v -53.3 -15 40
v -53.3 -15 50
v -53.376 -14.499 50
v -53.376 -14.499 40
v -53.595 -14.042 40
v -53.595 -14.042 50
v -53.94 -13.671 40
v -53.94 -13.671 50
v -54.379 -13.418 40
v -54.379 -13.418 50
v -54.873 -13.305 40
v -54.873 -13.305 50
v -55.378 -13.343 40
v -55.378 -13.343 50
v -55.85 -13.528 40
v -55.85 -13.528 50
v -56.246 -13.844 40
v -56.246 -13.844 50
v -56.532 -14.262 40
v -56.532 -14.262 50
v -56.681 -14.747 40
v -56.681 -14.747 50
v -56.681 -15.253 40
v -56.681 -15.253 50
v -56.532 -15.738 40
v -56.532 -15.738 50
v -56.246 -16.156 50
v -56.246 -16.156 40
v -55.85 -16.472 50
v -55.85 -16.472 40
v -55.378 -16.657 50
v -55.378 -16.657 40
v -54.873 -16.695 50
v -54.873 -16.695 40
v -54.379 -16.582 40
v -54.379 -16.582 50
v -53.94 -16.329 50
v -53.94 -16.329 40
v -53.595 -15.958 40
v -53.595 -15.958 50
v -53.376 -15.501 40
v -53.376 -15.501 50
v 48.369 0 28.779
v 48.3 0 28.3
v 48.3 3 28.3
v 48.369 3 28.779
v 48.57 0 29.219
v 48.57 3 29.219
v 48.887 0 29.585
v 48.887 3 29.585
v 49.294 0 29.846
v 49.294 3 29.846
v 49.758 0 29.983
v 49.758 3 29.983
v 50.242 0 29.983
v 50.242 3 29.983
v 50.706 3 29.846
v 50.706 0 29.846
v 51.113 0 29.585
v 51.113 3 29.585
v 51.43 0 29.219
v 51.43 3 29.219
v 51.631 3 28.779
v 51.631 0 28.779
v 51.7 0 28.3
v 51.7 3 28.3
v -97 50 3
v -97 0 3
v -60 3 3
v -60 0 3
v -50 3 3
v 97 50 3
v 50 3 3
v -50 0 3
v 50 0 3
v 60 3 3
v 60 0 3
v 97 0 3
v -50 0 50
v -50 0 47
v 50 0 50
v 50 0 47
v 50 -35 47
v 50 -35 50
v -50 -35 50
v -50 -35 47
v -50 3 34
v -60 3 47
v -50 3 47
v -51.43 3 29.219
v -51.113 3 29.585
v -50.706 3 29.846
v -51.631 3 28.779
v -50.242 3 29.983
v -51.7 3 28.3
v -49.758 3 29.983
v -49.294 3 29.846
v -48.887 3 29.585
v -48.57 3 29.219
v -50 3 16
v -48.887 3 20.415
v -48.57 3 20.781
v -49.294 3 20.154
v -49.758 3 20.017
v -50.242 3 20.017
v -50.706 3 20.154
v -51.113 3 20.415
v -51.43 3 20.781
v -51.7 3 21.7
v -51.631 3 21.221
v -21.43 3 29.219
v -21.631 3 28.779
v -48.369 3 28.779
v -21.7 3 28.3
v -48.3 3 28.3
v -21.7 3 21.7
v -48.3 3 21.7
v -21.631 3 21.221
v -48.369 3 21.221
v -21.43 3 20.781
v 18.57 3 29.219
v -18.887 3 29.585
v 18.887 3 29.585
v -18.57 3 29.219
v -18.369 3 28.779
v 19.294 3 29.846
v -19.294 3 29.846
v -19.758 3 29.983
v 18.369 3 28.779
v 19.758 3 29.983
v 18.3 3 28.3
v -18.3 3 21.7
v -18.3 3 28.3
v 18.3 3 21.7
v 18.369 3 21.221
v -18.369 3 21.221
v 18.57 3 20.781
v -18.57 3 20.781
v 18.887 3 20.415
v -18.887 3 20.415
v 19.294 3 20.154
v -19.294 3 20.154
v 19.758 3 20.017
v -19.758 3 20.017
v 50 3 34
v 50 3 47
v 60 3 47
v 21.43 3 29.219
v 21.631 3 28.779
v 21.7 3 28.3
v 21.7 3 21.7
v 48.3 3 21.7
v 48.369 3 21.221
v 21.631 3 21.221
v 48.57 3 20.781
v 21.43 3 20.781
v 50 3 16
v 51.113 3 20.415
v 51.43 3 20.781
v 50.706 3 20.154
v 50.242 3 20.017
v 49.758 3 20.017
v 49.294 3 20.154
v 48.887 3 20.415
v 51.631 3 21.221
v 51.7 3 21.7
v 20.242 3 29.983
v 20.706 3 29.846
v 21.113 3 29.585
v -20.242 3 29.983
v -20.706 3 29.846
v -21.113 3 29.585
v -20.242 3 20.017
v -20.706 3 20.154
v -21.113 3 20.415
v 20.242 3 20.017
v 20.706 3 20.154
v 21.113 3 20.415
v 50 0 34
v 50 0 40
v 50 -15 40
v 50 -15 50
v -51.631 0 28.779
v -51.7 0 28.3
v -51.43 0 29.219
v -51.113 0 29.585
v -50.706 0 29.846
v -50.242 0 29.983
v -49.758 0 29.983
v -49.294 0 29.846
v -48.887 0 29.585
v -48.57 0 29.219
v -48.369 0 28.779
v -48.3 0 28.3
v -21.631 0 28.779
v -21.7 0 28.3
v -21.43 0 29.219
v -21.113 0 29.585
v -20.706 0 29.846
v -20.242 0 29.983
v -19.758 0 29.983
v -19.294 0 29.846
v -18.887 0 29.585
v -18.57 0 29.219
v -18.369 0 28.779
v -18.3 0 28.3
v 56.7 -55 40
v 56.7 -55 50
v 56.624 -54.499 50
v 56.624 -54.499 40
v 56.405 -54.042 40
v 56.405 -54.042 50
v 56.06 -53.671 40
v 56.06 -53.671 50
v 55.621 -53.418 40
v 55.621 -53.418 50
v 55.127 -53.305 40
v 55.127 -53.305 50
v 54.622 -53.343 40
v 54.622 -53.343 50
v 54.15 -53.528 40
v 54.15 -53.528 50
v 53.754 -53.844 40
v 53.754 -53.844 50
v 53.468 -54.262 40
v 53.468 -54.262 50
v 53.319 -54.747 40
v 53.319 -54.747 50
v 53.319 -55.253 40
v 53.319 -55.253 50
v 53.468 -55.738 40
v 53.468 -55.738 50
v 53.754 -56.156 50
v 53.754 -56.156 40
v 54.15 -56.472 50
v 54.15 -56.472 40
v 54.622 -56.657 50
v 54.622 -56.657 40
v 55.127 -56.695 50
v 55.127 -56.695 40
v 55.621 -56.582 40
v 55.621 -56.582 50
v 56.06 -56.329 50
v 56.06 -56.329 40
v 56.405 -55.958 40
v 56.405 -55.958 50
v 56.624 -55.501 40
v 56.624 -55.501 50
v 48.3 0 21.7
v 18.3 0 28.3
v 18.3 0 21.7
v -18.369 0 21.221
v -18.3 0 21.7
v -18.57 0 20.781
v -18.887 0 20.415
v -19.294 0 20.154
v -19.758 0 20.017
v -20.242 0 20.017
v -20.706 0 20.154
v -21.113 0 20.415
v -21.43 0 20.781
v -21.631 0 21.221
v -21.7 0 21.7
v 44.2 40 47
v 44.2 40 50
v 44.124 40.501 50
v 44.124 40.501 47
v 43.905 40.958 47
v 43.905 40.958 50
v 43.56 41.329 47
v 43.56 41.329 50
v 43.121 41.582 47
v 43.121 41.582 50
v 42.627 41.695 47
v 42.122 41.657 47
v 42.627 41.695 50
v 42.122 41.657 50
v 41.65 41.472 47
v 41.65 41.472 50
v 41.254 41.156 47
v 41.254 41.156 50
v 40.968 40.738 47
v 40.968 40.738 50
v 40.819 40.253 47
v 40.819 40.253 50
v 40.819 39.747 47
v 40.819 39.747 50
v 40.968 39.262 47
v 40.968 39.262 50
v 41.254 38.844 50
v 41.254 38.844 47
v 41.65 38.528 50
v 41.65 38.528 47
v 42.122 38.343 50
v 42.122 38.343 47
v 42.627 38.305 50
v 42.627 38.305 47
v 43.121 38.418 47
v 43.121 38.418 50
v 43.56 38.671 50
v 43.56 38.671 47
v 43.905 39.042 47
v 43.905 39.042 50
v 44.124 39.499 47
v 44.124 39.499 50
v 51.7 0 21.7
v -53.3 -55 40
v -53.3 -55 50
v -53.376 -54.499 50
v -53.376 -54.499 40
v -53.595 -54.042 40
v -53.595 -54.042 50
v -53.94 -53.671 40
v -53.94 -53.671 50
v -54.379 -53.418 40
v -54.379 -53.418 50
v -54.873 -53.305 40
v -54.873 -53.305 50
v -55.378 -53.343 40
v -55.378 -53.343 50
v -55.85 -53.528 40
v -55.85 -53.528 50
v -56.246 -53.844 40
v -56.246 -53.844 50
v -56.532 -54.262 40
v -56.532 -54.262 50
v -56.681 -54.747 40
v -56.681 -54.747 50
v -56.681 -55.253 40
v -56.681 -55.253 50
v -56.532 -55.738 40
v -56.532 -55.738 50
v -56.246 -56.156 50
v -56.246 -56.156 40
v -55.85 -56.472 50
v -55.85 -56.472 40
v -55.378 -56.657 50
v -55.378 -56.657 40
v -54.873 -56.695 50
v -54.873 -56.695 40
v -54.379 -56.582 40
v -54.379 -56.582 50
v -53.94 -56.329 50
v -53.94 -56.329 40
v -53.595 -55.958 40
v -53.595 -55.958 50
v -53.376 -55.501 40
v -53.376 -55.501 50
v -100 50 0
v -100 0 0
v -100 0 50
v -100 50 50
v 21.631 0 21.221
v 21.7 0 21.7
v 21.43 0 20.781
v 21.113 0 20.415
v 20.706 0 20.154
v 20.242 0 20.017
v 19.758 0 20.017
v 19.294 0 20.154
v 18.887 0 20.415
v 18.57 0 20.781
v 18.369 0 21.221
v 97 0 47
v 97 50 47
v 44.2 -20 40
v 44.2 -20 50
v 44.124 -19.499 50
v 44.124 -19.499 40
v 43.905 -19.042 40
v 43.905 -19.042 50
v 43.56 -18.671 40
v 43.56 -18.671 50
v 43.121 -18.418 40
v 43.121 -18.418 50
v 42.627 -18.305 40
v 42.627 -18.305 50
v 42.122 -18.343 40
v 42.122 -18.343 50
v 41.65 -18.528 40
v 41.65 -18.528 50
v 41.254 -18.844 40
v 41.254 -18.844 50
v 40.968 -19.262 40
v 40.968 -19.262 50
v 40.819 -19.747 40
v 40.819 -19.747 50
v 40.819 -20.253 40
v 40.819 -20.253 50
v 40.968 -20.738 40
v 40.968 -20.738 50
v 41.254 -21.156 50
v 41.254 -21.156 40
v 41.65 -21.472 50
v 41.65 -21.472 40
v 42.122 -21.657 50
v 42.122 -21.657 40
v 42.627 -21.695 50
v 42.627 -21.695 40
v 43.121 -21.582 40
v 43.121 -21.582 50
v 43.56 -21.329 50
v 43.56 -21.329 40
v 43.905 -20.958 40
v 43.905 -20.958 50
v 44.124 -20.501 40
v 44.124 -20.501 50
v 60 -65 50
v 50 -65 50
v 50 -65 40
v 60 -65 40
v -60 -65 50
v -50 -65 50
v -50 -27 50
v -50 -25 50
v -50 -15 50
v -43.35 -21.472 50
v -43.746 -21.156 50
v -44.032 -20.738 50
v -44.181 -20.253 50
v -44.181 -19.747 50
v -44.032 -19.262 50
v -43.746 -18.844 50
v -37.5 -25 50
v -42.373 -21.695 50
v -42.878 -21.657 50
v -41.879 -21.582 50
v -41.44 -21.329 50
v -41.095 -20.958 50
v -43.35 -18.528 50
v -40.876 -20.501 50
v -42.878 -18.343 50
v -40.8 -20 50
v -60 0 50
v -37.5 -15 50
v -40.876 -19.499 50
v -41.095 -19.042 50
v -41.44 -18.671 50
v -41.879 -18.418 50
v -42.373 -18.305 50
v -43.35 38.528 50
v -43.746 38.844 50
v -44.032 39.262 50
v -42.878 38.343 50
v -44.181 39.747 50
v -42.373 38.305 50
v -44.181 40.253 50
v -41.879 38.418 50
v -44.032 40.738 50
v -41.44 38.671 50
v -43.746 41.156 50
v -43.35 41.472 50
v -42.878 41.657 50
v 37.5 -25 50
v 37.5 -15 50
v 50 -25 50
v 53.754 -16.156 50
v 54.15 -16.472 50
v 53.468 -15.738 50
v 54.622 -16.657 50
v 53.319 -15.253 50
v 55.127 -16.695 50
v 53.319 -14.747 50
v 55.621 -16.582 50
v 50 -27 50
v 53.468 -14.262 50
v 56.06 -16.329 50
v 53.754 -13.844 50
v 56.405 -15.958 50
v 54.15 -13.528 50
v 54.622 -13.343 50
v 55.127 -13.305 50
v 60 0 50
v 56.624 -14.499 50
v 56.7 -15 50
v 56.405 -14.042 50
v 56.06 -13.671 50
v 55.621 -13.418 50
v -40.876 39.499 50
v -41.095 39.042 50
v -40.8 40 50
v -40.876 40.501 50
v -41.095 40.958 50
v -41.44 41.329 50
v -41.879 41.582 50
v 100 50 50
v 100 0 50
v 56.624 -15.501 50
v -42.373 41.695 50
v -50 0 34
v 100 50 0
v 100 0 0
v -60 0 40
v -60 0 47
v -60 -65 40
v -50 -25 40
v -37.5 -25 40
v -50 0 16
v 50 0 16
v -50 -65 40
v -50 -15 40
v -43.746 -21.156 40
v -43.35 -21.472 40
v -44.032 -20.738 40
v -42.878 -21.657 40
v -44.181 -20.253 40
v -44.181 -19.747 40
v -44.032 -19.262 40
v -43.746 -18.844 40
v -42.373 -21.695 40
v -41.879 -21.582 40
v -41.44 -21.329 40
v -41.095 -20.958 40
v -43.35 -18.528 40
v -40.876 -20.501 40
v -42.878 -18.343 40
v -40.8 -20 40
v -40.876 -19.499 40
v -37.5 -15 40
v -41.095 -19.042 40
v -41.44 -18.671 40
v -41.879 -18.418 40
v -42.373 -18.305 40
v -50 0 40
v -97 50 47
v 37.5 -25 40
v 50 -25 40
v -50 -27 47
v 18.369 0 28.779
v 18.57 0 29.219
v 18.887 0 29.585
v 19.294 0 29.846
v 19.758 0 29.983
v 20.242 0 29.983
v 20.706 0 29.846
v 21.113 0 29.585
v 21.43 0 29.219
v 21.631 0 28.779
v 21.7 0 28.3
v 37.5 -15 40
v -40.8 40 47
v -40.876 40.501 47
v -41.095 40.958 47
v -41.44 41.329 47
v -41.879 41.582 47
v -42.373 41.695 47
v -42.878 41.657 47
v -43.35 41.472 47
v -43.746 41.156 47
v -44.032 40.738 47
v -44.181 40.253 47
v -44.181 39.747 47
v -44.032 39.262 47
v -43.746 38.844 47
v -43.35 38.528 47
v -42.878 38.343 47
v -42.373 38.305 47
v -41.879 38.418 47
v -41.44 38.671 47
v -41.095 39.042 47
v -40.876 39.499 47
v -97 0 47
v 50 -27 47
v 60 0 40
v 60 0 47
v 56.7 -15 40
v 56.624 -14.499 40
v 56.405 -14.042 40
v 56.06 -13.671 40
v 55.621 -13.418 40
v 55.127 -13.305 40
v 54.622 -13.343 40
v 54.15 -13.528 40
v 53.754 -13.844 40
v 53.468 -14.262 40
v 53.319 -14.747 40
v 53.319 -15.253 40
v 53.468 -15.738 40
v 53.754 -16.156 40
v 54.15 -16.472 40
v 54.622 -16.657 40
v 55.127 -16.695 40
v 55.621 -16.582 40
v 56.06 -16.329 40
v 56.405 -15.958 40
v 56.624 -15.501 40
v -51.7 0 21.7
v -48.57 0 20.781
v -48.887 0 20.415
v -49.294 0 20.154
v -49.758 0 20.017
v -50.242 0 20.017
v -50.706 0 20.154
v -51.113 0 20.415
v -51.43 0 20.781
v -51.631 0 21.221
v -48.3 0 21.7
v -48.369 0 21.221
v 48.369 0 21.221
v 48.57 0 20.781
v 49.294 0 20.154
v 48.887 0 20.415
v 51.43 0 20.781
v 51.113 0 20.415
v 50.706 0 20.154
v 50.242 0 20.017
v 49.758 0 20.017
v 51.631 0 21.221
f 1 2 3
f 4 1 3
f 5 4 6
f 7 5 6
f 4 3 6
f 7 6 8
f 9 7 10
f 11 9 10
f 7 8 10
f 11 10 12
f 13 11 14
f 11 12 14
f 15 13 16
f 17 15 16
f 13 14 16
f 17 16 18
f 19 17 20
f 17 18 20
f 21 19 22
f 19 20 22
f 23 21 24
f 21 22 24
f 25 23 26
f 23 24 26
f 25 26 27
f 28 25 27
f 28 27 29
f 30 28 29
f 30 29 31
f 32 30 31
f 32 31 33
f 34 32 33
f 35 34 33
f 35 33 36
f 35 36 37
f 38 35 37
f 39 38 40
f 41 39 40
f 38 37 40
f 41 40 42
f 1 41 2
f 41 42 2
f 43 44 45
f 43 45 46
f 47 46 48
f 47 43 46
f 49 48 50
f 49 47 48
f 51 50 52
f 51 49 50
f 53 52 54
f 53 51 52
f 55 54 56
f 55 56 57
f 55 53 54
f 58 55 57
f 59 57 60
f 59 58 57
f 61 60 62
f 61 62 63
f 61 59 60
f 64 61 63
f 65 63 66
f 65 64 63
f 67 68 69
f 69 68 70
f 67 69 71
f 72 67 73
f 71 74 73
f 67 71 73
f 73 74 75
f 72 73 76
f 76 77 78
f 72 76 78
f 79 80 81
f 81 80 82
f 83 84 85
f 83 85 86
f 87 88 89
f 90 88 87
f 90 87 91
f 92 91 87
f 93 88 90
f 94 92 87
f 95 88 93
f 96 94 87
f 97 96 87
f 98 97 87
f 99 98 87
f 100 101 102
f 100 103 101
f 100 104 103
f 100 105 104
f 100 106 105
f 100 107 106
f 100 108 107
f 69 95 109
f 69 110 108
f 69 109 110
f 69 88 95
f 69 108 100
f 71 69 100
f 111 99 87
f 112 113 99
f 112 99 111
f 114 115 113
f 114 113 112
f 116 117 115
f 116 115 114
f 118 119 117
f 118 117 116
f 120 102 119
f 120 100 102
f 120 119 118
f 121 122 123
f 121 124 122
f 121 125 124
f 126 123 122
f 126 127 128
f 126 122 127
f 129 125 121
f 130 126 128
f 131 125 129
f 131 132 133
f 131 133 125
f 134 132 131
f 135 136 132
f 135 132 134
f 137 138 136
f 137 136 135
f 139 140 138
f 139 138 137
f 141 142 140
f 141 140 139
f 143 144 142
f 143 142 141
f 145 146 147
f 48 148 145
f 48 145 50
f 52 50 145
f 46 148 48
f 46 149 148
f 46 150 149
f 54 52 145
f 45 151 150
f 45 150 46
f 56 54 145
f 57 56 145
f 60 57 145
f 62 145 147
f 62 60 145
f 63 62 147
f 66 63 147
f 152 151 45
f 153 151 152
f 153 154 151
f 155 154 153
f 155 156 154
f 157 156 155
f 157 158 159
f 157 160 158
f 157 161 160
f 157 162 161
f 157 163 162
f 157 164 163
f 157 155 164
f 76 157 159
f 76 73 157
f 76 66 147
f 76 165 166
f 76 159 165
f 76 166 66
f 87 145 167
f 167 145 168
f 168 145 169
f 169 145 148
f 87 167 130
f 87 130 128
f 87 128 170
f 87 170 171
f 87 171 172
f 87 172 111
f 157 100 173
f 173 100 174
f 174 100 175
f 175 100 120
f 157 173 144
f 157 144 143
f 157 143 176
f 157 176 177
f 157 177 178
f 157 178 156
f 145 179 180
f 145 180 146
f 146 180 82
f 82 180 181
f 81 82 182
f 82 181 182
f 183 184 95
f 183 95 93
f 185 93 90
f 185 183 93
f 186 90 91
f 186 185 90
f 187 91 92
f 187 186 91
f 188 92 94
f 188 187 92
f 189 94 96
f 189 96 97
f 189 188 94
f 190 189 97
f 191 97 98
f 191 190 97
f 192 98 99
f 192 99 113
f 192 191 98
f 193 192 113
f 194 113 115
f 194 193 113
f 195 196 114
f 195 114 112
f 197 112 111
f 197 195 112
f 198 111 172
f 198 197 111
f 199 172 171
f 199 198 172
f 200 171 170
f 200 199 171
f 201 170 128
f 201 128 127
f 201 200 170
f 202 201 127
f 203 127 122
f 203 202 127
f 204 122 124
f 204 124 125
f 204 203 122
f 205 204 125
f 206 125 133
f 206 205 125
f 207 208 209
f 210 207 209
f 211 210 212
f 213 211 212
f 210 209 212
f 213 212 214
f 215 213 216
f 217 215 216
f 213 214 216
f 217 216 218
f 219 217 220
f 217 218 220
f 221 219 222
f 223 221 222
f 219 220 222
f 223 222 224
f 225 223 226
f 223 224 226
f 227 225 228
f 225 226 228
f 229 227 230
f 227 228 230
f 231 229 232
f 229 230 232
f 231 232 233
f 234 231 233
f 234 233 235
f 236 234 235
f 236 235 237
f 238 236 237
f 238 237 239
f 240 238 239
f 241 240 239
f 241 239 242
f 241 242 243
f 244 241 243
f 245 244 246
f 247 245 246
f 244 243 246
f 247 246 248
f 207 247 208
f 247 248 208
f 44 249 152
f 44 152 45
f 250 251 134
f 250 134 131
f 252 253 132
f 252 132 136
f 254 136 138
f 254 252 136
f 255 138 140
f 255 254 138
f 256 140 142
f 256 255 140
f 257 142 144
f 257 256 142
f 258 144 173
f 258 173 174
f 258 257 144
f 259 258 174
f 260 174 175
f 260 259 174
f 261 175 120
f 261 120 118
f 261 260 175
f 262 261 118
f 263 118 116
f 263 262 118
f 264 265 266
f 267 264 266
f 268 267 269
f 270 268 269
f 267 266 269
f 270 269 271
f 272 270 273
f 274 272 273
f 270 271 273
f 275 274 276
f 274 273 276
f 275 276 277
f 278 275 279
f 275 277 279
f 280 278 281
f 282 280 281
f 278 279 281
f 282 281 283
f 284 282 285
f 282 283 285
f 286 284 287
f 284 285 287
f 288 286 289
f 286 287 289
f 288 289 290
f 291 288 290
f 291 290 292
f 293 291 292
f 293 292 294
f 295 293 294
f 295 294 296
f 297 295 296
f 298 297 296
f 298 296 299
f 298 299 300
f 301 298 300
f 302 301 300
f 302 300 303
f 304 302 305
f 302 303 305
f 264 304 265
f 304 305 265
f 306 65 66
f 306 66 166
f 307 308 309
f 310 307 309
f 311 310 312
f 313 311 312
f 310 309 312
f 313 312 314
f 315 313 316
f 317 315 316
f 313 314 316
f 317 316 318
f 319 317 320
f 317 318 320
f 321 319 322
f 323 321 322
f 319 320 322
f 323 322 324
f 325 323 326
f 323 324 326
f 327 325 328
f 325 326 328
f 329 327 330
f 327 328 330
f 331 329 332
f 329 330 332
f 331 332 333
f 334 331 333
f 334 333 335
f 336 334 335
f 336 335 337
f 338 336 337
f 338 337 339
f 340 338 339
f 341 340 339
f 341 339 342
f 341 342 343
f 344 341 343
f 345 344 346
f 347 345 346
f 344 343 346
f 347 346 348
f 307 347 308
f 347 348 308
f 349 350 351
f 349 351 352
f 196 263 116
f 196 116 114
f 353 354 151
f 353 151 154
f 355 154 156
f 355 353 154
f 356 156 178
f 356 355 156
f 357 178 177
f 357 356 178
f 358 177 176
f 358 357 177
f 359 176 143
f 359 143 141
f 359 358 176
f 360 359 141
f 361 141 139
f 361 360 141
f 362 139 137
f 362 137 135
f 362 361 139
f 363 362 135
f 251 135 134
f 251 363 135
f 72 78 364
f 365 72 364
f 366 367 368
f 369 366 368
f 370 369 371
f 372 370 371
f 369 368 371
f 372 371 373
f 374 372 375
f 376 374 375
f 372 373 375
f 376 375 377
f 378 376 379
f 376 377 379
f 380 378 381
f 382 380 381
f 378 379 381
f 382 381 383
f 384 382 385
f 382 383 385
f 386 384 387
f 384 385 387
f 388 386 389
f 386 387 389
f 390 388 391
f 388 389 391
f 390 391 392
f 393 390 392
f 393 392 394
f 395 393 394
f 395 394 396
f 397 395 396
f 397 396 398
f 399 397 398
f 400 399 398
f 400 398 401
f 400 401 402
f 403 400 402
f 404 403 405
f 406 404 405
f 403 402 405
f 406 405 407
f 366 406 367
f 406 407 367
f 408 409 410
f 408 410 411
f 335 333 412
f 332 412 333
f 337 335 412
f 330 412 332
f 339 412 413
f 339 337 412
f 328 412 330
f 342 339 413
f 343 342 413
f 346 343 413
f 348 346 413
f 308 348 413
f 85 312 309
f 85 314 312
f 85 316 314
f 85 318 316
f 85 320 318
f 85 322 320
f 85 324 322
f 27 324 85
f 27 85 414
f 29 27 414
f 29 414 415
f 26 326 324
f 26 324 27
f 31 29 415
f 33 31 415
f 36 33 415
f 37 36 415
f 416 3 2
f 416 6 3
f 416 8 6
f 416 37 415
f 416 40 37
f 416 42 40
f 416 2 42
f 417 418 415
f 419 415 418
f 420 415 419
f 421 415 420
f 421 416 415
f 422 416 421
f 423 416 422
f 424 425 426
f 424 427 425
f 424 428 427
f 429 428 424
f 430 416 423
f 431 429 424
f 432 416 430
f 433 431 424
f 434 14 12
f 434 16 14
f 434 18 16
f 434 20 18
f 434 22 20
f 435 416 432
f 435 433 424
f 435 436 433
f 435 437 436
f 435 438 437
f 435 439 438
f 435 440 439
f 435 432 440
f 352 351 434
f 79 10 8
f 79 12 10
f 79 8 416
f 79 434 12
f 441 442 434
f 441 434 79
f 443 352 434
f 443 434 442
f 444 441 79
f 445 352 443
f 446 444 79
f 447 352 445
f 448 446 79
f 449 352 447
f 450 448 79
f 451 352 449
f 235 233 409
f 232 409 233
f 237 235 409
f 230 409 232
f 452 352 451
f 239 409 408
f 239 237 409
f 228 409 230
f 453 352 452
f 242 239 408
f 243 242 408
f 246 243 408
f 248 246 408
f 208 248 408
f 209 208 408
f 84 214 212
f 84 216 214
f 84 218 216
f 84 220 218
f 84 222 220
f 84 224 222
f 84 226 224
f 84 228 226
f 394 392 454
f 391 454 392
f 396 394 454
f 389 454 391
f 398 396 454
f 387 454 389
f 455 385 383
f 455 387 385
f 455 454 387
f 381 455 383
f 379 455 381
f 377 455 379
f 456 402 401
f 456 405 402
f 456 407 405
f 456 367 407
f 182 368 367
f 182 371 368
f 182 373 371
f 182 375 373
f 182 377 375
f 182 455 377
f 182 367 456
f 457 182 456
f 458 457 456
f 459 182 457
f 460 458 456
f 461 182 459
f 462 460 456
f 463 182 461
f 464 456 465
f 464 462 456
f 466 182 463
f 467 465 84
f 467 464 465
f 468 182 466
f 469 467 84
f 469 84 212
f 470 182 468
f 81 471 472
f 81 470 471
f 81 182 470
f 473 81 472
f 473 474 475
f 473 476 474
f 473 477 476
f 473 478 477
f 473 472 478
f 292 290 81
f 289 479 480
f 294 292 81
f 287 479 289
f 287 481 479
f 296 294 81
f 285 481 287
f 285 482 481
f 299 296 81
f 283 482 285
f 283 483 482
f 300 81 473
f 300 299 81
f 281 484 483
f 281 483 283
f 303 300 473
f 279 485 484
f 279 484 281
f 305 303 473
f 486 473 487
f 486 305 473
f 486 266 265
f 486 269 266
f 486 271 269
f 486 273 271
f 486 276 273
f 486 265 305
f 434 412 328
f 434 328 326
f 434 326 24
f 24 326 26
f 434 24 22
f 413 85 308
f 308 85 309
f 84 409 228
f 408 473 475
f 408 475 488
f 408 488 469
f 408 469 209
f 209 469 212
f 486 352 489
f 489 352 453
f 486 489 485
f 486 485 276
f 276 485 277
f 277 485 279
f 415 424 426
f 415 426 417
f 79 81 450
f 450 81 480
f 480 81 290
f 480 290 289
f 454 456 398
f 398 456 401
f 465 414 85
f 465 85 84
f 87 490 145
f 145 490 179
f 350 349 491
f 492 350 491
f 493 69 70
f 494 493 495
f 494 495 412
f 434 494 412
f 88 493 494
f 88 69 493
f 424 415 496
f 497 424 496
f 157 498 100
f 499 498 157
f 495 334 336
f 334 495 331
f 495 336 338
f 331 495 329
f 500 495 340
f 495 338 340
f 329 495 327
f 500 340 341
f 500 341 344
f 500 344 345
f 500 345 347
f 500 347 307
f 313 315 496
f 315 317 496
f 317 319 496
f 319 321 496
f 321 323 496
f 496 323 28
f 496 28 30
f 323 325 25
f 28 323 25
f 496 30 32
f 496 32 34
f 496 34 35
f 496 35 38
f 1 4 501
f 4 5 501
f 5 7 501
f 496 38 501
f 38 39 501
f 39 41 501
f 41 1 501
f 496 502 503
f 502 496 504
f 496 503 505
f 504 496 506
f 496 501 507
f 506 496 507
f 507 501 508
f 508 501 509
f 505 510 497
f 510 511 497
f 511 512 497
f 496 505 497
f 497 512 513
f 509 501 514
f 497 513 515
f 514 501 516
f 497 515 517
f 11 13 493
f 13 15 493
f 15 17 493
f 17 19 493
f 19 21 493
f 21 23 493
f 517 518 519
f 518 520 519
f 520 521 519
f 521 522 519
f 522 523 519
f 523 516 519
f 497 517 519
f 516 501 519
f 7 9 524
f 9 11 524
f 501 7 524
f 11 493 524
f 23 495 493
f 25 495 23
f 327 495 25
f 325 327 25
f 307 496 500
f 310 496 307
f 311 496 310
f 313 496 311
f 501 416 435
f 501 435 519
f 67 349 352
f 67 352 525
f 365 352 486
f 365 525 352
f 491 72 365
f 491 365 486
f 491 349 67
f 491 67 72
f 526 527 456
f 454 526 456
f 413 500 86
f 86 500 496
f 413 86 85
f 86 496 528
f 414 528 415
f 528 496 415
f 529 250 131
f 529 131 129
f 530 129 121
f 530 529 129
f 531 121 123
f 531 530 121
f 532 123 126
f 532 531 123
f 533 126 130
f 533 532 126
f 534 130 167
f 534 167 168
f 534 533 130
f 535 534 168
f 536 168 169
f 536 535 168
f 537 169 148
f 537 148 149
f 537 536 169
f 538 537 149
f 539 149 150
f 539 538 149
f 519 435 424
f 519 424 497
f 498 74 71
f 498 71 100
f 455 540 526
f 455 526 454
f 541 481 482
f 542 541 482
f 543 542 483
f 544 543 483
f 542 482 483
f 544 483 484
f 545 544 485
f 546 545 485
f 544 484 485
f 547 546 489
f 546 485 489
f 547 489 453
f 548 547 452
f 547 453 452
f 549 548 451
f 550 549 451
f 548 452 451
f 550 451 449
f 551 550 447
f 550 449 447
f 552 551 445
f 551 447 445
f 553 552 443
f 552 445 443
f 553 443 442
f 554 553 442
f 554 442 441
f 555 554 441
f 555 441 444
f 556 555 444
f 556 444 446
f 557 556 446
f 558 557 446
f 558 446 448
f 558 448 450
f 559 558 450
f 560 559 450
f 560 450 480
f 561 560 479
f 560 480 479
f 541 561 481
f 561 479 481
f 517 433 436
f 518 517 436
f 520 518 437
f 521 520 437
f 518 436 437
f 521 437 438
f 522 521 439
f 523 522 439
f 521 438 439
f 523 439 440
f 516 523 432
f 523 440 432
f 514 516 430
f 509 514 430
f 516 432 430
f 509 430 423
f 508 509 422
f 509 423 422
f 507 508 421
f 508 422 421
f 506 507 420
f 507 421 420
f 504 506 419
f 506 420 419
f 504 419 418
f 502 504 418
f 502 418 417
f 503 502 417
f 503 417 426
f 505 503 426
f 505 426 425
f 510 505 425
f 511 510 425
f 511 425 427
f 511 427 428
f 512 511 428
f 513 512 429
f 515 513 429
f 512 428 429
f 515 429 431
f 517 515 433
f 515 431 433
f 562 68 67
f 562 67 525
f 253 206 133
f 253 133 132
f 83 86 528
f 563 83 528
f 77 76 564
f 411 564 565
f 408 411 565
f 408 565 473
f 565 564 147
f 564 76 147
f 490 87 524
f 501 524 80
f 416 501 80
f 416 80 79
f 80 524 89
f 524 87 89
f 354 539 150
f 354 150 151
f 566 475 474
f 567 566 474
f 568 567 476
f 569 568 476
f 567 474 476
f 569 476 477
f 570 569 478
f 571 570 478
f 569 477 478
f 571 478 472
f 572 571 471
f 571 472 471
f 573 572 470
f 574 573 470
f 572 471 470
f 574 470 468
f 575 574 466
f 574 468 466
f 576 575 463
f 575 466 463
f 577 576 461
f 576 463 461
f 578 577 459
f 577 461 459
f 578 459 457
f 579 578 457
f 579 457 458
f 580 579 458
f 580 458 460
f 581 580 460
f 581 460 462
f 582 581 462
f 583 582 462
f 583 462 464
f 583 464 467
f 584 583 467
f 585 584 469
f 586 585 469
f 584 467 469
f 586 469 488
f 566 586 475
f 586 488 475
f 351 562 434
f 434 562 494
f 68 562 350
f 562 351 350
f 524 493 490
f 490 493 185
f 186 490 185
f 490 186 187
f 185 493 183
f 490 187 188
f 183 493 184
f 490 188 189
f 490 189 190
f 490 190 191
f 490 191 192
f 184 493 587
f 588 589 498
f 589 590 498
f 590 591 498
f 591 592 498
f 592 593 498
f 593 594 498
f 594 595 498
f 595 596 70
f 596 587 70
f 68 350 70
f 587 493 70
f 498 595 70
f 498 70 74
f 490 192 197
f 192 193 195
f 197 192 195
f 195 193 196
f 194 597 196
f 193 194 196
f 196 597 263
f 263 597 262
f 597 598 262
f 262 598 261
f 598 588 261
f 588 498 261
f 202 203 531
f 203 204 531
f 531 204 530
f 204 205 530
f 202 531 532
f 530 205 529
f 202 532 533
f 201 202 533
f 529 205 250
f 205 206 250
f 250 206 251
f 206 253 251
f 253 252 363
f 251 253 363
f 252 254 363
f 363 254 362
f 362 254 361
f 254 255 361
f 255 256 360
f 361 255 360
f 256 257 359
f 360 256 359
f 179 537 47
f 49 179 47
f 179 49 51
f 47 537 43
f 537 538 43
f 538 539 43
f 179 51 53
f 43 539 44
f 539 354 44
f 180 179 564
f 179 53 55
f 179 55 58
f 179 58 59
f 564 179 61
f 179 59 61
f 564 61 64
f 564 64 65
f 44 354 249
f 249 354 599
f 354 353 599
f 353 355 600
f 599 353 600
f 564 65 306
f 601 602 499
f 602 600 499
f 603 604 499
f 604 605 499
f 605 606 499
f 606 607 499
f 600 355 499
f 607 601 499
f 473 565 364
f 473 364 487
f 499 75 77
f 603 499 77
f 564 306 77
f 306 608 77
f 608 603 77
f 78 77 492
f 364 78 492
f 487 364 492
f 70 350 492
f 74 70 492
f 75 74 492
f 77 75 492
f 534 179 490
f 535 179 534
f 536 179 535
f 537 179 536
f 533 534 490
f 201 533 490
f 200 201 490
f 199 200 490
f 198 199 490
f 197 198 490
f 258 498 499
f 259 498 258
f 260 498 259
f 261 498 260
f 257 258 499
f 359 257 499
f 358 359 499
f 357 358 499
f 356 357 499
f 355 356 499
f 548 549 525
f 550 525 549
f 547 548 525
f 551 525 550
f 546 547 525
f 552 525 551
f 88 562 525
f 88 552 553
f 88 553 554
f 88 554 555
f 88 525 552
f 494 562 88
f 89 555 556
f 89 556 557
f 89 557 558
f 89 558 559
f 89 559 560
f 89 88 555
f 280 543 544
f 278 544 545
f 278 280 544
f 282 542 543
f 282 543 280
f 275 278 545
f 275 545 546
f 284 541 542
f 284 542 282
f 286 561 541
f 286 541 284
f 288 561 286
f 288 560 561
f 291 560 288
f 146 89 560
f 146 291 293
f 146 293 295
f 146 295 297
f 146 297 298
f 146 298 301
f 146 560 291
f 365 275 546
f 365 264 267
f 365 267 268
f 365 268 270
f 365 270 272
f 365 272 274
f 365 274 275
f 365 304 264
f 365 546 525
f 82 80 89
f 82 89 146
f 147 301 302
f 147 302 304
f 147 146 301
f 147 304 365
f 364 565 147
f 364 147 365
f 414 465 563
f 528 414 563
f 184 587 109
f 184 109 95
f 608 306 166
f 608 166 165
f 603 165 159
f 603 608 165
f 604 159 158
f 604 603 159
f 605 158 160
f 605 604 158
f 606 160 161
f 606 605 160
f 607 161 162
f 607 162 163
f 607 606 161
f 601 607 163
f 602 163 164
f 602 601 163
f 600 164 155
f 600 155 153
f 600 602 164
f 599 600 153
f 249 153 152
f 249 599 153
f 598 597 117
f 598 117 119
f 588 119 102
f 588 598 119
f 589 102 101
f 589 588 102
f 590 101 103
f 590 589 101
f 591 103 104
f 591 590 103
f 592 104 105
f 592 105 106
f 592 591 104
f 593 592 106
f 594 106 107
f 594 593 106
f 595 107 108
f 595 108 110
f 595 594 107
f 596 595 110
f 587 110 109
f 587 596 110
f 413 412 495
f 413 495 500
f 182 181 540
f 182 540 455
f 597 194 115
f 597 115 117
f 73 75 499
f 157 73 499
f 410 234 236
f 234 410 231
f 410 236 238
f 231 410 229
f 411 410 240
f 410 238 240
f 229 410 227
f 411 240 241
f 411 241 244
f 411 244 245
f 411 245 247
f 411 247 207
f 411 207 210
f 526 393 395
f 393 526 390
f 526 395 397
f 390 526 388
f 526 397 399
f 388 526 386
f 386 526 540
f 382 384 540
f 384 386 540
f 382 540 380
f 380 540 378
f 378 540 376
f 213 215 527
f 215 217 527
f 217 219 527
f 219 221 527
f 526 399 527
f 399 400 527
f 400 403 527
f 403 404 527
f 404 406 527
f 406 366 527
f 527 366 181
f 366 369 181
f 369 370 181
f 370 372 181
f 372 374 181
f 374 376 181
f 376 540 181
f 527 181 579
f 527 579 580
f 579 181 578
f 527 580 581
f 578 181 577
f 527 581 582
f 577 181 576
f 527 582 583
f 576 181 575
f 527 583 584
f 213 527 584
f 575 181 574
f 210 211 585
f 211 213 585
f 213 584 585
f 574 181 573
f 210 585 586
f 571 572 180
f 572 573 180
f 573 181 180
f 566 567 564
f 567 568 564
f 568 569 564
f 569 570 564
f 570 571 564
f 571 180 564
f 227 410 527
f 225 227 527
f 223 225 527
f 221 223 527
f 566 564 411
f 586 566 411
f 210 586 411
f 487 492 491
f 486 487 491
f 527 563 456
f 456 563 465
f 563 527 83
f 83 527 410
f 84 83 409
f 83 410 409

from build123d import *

# Parameters (mm, degrees)
BOX_FOOTPRINT_200_X_50_MM_W                      = 200
BOX_FOOTPRINT_200_X_50_MM_H                      = 50
BOX_HEIGHT_50_MM_DEPTH                           = 50
REAR_OPENING_194_X_44_MM_W                       = 194
REAR_OPENING_194_X_44_MM_H                       = 44
REAR_CAVITY_WALL_3_MM_DEPTH                      = 47
CHASSIS_FACE_OPENINGS_AND_MOUNTING_CROSS_W       = 37
CHASSIS_FACE_OPENINGS_AND_MOUNTING_CROSS_H       = 44
CHASSIS_FACE_OPENINGS_AND_MOUNTING_CROSS_W_2     = 100
CHASSIS_FACE_OPENINGS_AND_MOUNTING_CROSS_H_2     = 13
OPEN_FRONT_MOUNTING_FRAME_DEPTH                  = 3
PHOTO_RAILS_10_X_10_PITCH_110_PROVISIONA_W       = 10
PHOTO_RAILS_10_X_10_PITCH_110_PROVISIONA_H       = 10
TWO_FORWARD_RAILS_65_MM_PROVISIONAL_DEPTH        = 65
LEFT_INWARD_PCB_MOUNTING_EAR_W                   = 10
LEFT_INWARD_PCB_MOUNTING_EAR_H                   = 10
LEFT_PCB_EAR_12_5_MM_DEPTH                       = 12.5
RIGHT_INWARD_PCB_MOUNTING_EAR_W                  = 10
RIGHT_INWARD_PCB_MOUNTING_EAR_H                  = 10
RIGHT_PCB_EAR_12_5_MM_DEPTH                      = 12.5
OPEN_FRAME_TRANSVERSE_BRACE_8_X_3_MM_W           = 3
OPEN_FRAME_TRANSVERSE_BRACE_8_X_3_MM_H           = 8
TRANSVERSE_FRAME_BRACE_DEPTH                     = 100
F_4X_VERTICAL_SLOTS_3_4_X_10_MM_DEPTH            = 3
PCB_REAR_HOLES_PITCH_85_MM_R                     = 1.7
PCB_ROOF_HOLES_DIAMETER_3_4_MM_DEPTH             = 3
PCB_FRONT_HOLES_ROW_SPACING_60_MM_R              = 1.7
PCB_EAR_HOLES_DIAMETER_3_4_MM_DEPTH              = 10
CHASSIS_TOP_HOLES_110_X_40_PROVISIONAL_R         = 1.7
F_4X_RAIL_HOLES_THROUGH_UPPER_AND_LOWER_FA_DEPTH = 10


with BuildPart() as part:
    # Box footprint 200 x 50 mm → Box height 50 mm (new body)
    with BuildSketch(Plane.XY):
        with Locations((0, 25)):
            Rectangle(BOX_FOOTPRINT_200_X_50_MM_W, BOX_FOOTPRINT_200_X_50_MM_H)
    extrude(amount=BOX_HEIGHT_50_MM_DEPTH)

    # Rear opening 194 x 44 mm → Rear cavity wall 3 mm (cut)
    with BuildSketch(Plane(origin=(0, 50, 0), x_dir=(1, 0, 0), z_dir=(0, 1, 0))):
        with Locations((0, -25)):
            Rectangle(REAR_OPENING_194_X_44_MM_W, REAR_OPENING_194_X_44_MM_H)
    extrude(amount=-REAR_CAVITY_WALL_3_MM_DEPTH, mode=Mode.SUBTRACT)

    # Chassis face openings and mounting crossbar → Open front mounting frame (cut)
    with BuildSketch(Plane.XZ):
        with Locations((-78.5, 25)):
            Rectangle(CHASSIS_FACE_OPENINGS_AND_MOUNTING_CROSS_W, CHASSIS_FACE_OPENINGS_AND_MOUNTING_CROSS_H)
        with Locations((78.5, 25)):
            Rectangle(CHASSIS_FACE_OPENINGS_AND_MOUNTING_CROSS_W, CHASSIS_FACE_OPENINGS_AND_MOUNTING_CROSS_H)
        with Locations((0, 9.5)):
            Rectangle(CHASSIS_FACE_OPENINGS_AND_MOUNTING_CROSS_W_2, CHASSIS_FACE_OPENINGS_AND_MOUNTING_CROSS_H_2)
        with Locations((0, 40.5)):
            Rectangle(CHASSIS_FACE_OPENINGS_AND_MOUNTING_CROSS_W_2, CHASSIS_FACE_OPENINGS_AND_MOUNTING_CROSS_H_2)
    extrude(amount=-OPEN_FRONT_MOUNTING_FRAME_DEPTH, mode=Mode.SUBTRACT)

    # Photo rails 10 x 10 pitch 110 provisional → Two forward rails 65 mm provisional (add)
    with BuildSketch(Plane.XZ):
        with Locations((-55, 45)):
            Rectangle(PHOTO_RAILS_10_X_10_PITCH_110_PROVISIONA_W, PHOTO_RAILS_10_X_10_PITCH_110_PROVISIONA_H)
        with Locations((55, 45)):
            Rectangle(PHOTO_RAILS_10_X_10_PITCH_110_PROVISIONA_W, PHOTO_RAILS_10_X_10_PITCH_110_PROVISIONA_H)
    extrude(amount=TWO_FORWARD_RAILS_65_MM_PROVISIONAL_DEPTH)

    # Left inward PCB mounting ear → Left PCB ear 12.5 mm (add)
    with BuildSketch(Plane(origin=(-50, 0, 0), x_dir=(0, 0, -1), z_dir=(1, 0, 0))):
        with Locations((-45, -20)):
            Rectangle(LEFT_INWARD_PCB_MOUNTING_EAR_W, LEFT_INWARD_PCB_MOUNTING_EAR_H)
    extrude(amount=LEFT_PCB_EAR_12_5_MM_DEPTH)

    # Right inward PCB mounting ear → Right PCB ear 12.5 mm (add)
    with BuildSketch(Plane.ZY.offset(-50)):
        with Locations((45, -20)):
            Rectangle(RIGHT_INWARD_PCB_MOUNTING_EAR_W, RIGHT_INWARD_PCB_MOUNTING_EAR_H)
    extrude(amount=RIGHT_PCB_EAR_12_5_MM_DEPTH)

    # Open frame transverse brace 8 x 3 mm → Transverse frame brace (add)
    with BuildSketch(Plane(origin=(-50, 0, 0), x_dir=(0, 0, -1), z_dir=(1, 0, 0))):
        with Locations((-48.5, -31)):
            Rectangle(OPEN_FRAME_TRANSVERSE_BRACE_8_X_3_MM_W, OPEN_FRAME_TRANSVERSE_BRACE_8_X_3_MM_H)
    extrude(amount=TRANSVERSE_FRAME_BRACE_DEPTH)

    # Chassis slot centers -50 -20 20 50 mm → 4x vertical slots 3.4 x 10 mm (cut)
    with BuildSketch(Plane.XZ):
        with BuildLine():
            Line((-51.7, 21.7), (-51.7, 28.3))
            ThreePointArc((-51.7, 28.3), (-50, 30), (-48.3, 28.3))
            Line((-48.3, 28.3), (-48.3, 21.7))
            ThreePointArc((-48.3, 21.7), (-50, 20), (-51.7, 21.7))
        make_face()
        with BuildLine():
            Line((-21.7, 21.7), (-21.7, 28.3))
            ThreePointArc((-21.7, 28.3), (-20, 30), (-18.3, 28.3))
            Line((-18.3, 28.3), (-18.3, 21.7))
            ThreePointArc((-18.3, 21.7), (-20, 20), (-21.7, 21.7))
        make_face()
        with BuildLine():
            Line((18.3, 21.7), (18.3, 28.3))
            ThreePointArc((18.3, 28.3), (20, 30), (21.7, 28.3))
            Line((21.7, 28.3), (21.7, 21.7))
            ThreePointArc((21.7, 21.7), (20, 20), (18.3, 21.7))
        make_face()
        with BuildLine():
            Line((48.3, 21.7), (48.3, 28.3))
            ThreePointArc((48.3, 28.3), (50, 30), (51.7, 28.3))
            Line((51.7, 28.3), (51.7, 21.7))
            ThreePointArc((51.7, 21.7), (50, 20), (48.3, 21.7))
        make_face()
    extrude(amount=-F_4X_VERTICAL_SLOTS_3_4_X_10_MM_DEPTH, mode=Mode.SUBTRACT)

    # PCB rear holes pitch 85 mm → PCB roof holes diameter 3.4 mm (cut)
    with BuildSketch(Plane.XY.offset(50)):
        with Locations((-42.5, 40)):
            Circle(PCB_REAR_HOLES_PITCH_85_MM_R)
        with Locations((42.5, 40)):
            Circle(PCB_REAR_HOLES_PITCH_85_MM_R)
    extrude(amount=-PCB_ROOF_HOLES_DIAMETER_3_4_MM_DEPTH, mode=Mode.SUBTRACT)

    # PCB front holes row spacing 60 mm → PCB ear holes diameter 3.4 mm (cut)
    with BuildSketch(Plane.XY.offset(50)):
        with Locations((-42.5, -20)):
            Circle(PCB_FRONT_HOLES_ROW_SPACING_60_MM_R)
        with Locations((42.5, -20)):
            Circle(PCB_FRONT_HOLES_ROW_SPACING_60_MM_R)
    extrude(amount=-PCB_EAR_HOLES_DIAMETER_3_4_MM_DEPTH, mode=Mode.SUBTRACT)

    # Chassis top holes 110 x 40 provisional → 4x rail holes through upper and lower faces (cut)
    with BuildSketch(Plane.XY.offset(50)):
        with Locations((-55, -55)):
            Circle(CHASSIS_TOP_HOLES_110_X_40_PROVISIONAL_R)
        with Locations((-55, -15)):
            Circle(CHASSIS_TOP_HOLES_110_X_40_PROVISIONAL_R)
        with Locations((55, -55)):
            Circle(CHASSIS_TOP_HOLES_110_X_40_PROVISIONAL_R)
        with Locations((55, -15)):
            Circle(CHASSIS_TOP_HOLES_110_X_40_PROVISIONAL_R)
    extrude(amount=-F_4X_RAIL_HOLES_THROUGH_UPPER_AND_LOWER_FA_DEPTH, mode=Mode.SUBTRACT)


solid = part.part
